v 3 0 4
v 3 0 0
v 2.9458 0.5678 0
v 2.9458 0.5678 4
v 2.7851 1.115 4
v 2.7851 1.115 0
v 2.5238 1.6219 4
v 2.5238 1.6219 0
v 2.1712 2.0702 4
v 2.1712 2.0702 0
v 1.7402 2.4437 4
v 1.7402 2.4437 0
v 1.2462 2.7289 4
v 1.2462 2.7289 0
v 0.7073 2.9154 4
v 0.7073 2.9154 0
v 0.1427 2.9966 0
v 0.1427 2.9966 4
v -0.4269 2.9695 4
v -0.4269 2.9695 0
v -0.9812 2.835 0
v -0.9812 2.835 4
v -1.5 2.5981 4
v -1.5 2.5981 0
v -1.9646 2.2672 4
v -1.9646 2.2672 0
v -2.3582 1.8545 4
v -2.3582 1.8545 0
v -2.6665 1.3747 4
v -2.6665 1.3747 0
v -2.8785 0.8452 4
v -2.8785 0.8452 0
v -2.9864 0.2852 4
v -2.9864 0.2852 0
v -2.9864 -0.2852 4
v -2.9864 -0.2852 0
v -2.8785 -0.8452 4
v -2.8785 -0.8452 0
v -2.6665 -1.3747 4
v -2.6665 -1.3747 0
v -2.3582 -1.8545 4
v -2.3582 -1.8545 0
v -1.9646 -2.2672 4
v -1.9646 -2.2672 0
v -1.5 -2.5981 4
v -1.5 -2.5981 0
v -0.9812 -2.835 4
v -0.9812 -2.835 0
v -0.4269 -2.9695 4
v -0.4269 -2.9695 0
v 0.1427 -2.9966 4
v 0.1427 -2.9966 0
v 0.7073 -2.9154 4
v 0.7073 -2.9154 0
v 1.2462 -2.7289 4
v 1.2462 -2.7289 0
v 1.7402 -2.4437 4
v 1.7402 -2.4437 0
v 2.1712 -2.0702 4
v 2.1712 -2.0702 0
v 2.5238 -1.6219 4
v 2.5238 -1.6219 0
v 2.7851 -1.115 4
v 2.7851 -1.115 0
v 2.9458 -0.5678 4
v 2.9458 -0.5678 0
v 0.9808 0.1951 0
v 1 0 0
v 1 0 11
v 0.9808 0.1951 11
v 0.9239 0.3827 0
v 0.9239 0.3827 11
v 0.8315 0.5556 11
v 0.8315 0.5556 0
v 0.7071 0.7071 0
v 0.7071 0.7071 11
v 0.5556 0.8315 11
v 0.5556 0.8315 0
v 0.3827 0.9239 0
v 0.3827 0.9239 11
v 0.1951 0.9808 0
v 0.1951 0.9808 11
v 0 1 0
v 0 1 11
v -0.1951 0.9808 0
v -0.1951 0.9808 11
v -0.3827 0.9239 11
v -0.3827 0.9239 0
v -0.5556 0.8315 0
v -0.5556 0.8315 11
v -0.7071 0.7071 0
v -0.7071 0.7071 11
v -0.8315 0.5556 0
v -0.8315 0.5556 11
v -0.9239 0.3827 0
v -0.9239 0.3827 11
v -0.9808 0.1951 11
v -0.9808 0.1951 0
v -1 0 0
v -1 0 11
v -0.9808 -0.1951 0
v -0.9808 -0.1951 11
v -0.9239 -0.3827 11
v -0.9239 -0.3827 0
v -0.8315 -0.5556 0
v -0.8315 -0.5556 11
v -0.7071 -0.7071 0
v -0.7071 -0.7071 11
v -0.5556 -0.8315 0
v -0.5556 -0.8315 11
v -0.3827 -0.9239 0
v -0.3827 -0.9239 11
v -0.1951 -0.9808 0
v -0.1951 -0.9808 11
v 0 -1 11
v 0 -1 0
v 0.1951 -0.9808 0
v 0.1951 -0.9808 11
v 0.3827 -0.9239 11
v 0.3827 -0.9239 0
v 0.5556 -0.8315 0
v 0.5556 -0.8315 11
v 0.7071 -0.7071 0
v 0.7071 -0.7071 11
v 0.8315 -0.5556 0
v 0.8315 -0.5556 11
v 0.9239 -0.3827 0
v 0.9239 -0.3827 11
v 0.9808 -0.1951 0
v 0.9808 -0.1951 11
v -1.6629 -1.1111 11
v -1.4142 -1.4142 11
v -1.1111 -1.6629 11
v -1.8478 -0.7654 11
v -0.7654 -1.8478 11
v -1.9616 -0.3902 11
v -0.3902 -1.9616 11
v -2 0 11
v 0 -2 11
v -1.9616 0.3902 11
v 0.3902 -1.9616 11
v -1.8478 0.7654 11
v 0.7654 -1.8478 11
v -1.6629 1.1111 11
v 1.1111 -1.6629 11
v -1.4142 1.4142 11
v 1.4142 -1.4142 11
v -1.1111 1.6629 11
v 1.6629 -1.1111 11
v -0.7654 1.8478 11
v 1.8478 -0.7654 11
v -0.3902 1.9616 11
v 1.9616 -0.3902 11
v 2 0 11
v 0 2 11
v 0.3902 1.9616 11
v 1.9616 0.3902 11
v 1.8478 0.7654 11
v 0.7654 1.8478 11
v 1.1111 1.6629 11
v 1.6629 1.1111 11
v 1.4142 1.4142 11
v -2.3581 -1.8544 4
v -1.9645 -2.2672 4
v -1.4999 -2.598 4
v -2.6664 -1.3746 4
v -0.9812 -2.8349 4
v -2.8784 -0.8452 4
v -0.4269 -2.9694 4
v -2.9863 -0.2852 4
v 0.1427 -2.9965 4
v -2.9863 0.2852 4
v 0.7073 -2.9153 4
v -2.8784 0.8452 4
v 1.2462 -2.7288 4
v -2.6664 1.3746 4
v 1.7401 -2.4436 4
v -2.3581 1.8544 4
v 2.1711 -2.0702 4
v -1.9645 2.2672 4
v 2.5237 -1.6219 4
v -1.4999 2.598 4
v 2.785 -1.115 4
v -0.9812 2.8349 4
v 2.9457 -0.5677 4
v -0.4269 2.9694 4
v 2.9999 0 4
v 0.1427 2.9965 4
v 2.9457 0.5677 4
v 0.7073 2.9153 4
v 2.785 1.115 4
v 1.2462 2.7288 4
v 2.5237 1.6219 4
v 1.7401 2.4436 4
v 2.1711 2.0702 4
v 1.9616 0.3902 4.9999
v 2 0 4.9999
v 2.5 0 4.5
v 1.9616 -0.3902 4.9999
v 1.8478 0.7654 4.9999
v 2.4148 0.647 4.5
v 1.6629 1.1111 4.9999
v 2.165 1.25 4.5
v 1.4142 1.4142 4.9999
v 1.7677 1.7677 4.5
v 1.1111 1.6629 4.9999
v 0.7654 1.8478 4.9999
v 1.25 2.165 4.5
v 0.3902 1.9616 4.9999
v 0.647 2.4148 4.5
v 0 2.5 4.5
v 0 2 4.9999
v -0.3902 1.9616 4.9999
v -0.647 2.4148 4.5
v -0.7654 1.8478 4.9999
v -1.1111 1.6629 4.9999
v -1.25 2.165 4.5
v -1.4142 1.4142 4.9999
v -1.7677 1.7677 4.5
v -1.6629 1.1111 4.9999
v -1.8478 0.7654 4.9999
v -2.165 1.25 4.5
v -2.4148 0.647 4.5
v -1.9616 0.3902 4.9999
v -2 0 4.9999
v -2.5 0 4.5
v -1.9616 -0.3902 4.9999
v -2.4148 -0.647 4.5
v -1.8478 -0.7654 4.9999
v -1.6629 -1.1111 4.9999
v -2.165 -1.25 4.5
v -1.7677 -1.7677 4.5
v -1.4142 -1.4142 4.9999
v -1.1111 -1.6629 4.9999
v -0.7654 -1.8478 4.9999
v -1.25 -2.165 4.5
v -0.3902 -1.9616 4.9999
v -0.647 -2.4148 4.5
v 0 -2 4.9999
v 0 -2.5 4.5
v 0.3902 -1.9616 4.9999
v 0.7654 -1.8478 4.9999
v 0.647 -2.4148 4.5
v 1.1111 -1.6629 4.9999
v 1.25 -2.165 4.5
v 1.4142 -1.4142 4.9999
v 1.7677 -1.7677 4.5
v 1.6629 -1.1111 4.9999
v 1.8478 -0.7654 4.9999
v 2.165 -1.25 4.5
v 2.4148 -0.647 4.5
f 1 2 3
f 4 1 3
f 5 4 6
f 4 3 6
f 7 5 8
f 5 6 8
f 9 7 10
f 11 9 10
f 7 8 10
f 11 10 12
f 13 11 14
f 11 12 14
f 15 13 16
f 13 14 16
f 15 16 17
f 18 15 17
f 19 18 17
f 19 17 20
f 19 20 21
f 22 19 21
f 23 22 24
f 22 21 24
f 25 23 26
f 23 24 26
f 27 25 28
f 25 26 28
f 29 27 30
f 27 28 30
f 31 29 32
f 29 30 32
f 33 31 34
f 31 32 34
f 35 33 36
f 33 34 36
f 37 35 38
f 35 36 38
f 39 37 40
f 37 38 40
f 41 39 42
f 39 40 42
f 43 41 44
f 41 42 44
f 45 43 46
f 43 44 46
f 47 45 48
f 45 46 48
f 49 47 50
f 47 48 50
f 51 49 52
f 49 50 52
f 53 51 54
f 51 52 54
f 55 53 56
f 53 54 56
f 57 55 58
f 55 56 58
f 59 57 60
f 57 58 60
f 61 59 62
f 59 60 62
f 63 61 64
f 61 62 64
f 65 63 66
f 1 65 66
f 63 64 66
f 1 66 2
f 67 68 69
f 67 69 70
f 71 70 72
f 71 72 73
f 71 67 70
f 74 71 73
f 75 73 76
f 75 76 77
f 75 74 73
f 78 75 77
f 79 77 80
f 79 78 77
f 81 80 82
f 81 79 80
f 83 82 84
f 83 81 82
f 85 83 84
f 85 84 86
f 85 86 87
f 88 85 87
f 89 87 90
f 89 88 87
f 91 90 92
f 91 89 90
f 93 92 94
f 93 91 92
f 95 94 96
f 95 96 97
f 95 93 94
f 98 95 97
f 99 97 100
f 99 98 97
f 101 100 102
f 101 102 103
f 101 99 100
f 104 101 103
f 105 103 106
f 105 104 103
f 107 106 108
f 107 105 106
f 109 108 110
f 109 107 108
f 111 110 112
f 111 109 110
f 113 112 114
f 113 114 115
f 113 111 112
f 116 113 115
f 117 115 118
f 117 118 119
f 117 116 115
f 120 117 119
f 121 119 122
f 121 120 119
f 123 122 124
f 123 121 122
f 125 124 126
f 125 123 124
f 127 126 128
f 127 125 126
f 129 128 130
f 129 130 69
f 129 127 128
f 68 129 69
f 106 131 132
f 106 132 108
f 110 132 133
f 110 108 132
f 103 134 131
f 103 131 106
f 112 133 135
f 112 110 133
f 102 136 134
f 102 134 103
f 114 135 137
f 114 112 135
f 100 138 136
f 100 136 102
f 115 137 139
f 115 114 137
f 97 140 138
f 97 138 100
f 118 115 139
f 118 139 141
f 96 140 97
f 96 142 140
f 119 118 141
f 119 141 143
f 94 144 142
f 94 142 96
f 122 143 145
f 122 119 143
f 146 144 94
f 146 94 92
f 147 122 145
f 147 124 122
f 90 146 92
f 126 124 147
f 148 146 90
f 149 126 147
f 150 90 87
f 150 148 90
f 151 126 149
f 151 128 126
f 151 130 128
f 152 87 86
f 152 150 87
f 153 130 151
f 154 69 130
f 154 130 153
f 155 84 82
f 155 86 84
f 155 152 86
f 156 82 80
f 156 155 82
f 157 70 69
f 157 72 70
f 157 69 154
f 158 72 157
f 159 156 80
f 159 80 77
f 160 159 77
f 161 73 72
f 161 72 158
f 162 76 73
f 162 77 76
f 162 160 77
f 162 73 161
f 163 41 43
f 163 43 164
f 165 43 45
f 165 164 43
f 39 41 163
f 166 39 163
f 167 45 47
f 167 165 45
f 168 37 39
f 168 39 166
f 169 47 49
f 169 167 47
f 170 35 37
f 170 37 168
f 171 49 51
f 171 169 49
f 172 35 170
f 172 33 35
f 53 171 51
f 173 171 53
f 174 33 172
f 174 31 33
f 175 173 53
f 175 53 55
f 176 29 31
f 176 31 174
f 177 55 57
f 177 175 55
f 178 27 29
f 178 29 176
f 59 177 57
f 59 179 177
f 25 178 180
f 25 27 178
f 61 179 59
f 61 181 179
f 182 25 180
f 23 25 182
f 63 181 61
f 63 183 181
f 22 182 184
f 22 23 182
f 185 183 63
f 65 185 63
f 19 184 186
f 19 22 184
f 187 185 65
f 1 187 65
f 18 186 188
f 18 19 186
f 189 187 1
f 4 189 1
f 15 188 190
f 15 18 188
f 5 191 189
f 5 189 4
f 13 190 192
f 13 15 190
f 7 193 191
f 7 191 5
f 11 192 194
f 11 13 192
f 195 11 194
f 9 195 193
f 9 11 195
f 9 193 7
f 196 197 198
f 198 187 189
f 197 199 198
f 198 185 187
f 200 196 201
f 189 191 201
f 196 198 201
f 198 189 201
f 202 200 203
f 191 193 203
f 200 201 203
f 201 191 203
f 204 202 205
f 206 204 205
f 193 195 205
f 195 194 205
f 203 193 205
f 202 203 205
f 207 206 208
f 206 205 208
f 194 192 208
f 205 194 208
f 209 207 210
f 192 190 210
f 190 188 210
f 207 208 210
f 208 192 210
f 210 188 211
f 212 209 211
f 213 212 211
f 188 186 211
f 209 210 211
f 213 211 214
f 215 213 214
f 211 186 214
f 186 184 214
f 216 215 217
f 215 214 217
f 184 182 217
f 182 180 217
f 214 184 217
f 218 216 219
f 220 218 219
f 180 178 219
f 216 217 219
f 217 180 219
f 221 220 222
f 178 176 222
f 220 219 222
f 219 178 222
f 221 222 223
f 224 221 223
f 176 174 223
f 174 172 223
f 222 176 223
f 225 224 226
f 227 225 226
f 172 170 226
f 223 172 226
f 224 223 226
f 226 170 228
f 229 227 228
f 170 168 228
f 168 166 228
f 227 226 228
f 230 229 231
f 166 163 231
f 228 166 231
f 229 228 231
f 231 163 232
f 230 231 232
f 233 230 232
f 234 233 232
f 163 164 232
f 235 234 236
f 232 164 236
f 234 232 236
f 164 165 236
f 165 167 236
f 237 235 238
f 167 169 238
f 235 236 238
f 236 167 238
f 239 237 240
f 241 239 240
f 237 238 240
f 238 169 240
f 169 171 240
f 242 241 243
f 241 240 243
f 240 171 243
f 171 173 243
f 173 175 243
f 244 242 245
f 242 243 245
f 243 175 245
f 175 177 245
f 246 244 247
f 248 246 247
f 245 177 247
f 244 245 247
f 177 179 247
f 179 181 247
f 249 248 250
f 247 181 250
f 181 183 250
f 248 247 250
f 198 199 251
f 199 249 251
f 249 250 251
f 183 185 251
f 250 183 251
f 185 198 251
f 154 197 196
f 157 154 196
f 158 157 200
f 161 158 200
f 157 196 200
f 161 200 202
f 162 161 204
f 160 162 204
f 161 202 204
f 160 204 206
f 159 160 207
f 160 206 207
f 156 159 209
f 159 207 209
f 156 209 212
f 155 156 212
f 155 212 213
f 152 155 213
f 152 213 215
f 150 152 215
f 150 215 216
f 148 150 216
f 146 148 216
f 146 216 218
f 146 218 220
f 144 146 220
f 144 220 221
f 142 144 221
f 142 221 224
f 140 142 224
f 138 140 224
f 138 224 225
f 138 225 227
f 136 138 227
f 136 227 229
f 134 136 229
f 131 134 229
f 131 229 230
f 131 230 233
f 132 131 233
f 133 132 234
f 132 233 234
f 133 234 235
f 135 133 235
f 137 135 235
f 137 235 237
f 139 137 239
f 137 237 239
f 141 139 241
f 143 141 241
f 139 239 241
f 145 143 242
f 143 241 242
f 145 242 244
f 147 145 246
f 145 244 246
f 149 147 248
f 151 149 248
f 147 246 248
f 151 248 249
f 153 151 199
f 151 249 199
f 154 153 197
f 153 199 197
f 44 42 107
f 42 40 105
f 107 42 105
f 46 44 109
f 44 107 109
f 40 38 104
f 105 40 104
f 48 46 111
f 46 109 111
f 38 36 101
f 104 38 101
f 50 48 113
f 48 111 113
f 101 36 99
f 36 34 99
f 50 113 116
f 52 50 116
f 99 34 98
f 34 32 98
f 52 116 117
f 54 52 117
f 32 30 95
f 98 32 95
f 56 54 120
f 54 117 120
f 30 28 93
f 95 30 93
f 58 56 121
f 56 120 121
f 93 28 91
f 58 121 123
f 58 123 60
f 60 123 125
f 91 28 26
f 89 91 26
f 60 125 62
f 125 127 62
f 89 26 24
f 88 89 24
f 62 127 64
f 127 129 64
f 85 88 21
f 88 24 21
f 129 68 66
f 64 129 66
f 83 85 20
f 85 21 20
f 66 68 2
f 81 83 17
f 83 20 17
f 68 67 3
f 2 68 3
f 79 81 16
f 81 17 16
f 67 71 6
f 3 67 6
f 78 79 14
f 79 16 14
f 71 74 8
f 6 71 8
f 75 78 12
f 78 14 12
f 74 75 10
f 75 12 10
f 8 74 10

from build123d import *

# Parameters (mm, degrees)
BASE_SKETCH_R           = 3
BASE_SKETCH_R_2         = 2
EXTRUDE_PIN_THICK_DEPTH = 4
BASE_SKETCH_3_R         = 2
BASE_SKETCH_3_R_2       = 1
EXTRUDE_PIN_THIN_DEPTH  = 11
CHAMFER_2_SIZE          = 1


with BuildPart() as part:
    # Base Sketch → Extrude Pin Thick (new body)
    with BuildSketch(Plane.XY):
        Circle(BASE_SKETCH_R)
        Circle(BASE_SKETCH_R_2, mode=Mode.SUBTRACT)
    extrude(amount=EXTRUDE_PIN_THICK_DEPTH)

    # Base Sketch<3> → Extrude Pin Thin (add)
    with BuildSketch(Plane.XY):
        Circle(BASE_SKETCH_3_R)
        Circle(BASE_SKETCH_3_R_2, mode=Mode.SUBTRACT)
    extrude(amount=EXTRUDE_PIN_THIN_DEPTH)

    # Chamfer 2
    chamfer_2_edges = [part.edges().sort_by_distance(p)[0] for p in [
        (-2, 0, 4),
    ]]
    chamfer(chamfer_2_edges, length=CHAMFER_2_SIZE - 0.0001)  # a hair under: the kernel refuses the full size


solid = part.part
